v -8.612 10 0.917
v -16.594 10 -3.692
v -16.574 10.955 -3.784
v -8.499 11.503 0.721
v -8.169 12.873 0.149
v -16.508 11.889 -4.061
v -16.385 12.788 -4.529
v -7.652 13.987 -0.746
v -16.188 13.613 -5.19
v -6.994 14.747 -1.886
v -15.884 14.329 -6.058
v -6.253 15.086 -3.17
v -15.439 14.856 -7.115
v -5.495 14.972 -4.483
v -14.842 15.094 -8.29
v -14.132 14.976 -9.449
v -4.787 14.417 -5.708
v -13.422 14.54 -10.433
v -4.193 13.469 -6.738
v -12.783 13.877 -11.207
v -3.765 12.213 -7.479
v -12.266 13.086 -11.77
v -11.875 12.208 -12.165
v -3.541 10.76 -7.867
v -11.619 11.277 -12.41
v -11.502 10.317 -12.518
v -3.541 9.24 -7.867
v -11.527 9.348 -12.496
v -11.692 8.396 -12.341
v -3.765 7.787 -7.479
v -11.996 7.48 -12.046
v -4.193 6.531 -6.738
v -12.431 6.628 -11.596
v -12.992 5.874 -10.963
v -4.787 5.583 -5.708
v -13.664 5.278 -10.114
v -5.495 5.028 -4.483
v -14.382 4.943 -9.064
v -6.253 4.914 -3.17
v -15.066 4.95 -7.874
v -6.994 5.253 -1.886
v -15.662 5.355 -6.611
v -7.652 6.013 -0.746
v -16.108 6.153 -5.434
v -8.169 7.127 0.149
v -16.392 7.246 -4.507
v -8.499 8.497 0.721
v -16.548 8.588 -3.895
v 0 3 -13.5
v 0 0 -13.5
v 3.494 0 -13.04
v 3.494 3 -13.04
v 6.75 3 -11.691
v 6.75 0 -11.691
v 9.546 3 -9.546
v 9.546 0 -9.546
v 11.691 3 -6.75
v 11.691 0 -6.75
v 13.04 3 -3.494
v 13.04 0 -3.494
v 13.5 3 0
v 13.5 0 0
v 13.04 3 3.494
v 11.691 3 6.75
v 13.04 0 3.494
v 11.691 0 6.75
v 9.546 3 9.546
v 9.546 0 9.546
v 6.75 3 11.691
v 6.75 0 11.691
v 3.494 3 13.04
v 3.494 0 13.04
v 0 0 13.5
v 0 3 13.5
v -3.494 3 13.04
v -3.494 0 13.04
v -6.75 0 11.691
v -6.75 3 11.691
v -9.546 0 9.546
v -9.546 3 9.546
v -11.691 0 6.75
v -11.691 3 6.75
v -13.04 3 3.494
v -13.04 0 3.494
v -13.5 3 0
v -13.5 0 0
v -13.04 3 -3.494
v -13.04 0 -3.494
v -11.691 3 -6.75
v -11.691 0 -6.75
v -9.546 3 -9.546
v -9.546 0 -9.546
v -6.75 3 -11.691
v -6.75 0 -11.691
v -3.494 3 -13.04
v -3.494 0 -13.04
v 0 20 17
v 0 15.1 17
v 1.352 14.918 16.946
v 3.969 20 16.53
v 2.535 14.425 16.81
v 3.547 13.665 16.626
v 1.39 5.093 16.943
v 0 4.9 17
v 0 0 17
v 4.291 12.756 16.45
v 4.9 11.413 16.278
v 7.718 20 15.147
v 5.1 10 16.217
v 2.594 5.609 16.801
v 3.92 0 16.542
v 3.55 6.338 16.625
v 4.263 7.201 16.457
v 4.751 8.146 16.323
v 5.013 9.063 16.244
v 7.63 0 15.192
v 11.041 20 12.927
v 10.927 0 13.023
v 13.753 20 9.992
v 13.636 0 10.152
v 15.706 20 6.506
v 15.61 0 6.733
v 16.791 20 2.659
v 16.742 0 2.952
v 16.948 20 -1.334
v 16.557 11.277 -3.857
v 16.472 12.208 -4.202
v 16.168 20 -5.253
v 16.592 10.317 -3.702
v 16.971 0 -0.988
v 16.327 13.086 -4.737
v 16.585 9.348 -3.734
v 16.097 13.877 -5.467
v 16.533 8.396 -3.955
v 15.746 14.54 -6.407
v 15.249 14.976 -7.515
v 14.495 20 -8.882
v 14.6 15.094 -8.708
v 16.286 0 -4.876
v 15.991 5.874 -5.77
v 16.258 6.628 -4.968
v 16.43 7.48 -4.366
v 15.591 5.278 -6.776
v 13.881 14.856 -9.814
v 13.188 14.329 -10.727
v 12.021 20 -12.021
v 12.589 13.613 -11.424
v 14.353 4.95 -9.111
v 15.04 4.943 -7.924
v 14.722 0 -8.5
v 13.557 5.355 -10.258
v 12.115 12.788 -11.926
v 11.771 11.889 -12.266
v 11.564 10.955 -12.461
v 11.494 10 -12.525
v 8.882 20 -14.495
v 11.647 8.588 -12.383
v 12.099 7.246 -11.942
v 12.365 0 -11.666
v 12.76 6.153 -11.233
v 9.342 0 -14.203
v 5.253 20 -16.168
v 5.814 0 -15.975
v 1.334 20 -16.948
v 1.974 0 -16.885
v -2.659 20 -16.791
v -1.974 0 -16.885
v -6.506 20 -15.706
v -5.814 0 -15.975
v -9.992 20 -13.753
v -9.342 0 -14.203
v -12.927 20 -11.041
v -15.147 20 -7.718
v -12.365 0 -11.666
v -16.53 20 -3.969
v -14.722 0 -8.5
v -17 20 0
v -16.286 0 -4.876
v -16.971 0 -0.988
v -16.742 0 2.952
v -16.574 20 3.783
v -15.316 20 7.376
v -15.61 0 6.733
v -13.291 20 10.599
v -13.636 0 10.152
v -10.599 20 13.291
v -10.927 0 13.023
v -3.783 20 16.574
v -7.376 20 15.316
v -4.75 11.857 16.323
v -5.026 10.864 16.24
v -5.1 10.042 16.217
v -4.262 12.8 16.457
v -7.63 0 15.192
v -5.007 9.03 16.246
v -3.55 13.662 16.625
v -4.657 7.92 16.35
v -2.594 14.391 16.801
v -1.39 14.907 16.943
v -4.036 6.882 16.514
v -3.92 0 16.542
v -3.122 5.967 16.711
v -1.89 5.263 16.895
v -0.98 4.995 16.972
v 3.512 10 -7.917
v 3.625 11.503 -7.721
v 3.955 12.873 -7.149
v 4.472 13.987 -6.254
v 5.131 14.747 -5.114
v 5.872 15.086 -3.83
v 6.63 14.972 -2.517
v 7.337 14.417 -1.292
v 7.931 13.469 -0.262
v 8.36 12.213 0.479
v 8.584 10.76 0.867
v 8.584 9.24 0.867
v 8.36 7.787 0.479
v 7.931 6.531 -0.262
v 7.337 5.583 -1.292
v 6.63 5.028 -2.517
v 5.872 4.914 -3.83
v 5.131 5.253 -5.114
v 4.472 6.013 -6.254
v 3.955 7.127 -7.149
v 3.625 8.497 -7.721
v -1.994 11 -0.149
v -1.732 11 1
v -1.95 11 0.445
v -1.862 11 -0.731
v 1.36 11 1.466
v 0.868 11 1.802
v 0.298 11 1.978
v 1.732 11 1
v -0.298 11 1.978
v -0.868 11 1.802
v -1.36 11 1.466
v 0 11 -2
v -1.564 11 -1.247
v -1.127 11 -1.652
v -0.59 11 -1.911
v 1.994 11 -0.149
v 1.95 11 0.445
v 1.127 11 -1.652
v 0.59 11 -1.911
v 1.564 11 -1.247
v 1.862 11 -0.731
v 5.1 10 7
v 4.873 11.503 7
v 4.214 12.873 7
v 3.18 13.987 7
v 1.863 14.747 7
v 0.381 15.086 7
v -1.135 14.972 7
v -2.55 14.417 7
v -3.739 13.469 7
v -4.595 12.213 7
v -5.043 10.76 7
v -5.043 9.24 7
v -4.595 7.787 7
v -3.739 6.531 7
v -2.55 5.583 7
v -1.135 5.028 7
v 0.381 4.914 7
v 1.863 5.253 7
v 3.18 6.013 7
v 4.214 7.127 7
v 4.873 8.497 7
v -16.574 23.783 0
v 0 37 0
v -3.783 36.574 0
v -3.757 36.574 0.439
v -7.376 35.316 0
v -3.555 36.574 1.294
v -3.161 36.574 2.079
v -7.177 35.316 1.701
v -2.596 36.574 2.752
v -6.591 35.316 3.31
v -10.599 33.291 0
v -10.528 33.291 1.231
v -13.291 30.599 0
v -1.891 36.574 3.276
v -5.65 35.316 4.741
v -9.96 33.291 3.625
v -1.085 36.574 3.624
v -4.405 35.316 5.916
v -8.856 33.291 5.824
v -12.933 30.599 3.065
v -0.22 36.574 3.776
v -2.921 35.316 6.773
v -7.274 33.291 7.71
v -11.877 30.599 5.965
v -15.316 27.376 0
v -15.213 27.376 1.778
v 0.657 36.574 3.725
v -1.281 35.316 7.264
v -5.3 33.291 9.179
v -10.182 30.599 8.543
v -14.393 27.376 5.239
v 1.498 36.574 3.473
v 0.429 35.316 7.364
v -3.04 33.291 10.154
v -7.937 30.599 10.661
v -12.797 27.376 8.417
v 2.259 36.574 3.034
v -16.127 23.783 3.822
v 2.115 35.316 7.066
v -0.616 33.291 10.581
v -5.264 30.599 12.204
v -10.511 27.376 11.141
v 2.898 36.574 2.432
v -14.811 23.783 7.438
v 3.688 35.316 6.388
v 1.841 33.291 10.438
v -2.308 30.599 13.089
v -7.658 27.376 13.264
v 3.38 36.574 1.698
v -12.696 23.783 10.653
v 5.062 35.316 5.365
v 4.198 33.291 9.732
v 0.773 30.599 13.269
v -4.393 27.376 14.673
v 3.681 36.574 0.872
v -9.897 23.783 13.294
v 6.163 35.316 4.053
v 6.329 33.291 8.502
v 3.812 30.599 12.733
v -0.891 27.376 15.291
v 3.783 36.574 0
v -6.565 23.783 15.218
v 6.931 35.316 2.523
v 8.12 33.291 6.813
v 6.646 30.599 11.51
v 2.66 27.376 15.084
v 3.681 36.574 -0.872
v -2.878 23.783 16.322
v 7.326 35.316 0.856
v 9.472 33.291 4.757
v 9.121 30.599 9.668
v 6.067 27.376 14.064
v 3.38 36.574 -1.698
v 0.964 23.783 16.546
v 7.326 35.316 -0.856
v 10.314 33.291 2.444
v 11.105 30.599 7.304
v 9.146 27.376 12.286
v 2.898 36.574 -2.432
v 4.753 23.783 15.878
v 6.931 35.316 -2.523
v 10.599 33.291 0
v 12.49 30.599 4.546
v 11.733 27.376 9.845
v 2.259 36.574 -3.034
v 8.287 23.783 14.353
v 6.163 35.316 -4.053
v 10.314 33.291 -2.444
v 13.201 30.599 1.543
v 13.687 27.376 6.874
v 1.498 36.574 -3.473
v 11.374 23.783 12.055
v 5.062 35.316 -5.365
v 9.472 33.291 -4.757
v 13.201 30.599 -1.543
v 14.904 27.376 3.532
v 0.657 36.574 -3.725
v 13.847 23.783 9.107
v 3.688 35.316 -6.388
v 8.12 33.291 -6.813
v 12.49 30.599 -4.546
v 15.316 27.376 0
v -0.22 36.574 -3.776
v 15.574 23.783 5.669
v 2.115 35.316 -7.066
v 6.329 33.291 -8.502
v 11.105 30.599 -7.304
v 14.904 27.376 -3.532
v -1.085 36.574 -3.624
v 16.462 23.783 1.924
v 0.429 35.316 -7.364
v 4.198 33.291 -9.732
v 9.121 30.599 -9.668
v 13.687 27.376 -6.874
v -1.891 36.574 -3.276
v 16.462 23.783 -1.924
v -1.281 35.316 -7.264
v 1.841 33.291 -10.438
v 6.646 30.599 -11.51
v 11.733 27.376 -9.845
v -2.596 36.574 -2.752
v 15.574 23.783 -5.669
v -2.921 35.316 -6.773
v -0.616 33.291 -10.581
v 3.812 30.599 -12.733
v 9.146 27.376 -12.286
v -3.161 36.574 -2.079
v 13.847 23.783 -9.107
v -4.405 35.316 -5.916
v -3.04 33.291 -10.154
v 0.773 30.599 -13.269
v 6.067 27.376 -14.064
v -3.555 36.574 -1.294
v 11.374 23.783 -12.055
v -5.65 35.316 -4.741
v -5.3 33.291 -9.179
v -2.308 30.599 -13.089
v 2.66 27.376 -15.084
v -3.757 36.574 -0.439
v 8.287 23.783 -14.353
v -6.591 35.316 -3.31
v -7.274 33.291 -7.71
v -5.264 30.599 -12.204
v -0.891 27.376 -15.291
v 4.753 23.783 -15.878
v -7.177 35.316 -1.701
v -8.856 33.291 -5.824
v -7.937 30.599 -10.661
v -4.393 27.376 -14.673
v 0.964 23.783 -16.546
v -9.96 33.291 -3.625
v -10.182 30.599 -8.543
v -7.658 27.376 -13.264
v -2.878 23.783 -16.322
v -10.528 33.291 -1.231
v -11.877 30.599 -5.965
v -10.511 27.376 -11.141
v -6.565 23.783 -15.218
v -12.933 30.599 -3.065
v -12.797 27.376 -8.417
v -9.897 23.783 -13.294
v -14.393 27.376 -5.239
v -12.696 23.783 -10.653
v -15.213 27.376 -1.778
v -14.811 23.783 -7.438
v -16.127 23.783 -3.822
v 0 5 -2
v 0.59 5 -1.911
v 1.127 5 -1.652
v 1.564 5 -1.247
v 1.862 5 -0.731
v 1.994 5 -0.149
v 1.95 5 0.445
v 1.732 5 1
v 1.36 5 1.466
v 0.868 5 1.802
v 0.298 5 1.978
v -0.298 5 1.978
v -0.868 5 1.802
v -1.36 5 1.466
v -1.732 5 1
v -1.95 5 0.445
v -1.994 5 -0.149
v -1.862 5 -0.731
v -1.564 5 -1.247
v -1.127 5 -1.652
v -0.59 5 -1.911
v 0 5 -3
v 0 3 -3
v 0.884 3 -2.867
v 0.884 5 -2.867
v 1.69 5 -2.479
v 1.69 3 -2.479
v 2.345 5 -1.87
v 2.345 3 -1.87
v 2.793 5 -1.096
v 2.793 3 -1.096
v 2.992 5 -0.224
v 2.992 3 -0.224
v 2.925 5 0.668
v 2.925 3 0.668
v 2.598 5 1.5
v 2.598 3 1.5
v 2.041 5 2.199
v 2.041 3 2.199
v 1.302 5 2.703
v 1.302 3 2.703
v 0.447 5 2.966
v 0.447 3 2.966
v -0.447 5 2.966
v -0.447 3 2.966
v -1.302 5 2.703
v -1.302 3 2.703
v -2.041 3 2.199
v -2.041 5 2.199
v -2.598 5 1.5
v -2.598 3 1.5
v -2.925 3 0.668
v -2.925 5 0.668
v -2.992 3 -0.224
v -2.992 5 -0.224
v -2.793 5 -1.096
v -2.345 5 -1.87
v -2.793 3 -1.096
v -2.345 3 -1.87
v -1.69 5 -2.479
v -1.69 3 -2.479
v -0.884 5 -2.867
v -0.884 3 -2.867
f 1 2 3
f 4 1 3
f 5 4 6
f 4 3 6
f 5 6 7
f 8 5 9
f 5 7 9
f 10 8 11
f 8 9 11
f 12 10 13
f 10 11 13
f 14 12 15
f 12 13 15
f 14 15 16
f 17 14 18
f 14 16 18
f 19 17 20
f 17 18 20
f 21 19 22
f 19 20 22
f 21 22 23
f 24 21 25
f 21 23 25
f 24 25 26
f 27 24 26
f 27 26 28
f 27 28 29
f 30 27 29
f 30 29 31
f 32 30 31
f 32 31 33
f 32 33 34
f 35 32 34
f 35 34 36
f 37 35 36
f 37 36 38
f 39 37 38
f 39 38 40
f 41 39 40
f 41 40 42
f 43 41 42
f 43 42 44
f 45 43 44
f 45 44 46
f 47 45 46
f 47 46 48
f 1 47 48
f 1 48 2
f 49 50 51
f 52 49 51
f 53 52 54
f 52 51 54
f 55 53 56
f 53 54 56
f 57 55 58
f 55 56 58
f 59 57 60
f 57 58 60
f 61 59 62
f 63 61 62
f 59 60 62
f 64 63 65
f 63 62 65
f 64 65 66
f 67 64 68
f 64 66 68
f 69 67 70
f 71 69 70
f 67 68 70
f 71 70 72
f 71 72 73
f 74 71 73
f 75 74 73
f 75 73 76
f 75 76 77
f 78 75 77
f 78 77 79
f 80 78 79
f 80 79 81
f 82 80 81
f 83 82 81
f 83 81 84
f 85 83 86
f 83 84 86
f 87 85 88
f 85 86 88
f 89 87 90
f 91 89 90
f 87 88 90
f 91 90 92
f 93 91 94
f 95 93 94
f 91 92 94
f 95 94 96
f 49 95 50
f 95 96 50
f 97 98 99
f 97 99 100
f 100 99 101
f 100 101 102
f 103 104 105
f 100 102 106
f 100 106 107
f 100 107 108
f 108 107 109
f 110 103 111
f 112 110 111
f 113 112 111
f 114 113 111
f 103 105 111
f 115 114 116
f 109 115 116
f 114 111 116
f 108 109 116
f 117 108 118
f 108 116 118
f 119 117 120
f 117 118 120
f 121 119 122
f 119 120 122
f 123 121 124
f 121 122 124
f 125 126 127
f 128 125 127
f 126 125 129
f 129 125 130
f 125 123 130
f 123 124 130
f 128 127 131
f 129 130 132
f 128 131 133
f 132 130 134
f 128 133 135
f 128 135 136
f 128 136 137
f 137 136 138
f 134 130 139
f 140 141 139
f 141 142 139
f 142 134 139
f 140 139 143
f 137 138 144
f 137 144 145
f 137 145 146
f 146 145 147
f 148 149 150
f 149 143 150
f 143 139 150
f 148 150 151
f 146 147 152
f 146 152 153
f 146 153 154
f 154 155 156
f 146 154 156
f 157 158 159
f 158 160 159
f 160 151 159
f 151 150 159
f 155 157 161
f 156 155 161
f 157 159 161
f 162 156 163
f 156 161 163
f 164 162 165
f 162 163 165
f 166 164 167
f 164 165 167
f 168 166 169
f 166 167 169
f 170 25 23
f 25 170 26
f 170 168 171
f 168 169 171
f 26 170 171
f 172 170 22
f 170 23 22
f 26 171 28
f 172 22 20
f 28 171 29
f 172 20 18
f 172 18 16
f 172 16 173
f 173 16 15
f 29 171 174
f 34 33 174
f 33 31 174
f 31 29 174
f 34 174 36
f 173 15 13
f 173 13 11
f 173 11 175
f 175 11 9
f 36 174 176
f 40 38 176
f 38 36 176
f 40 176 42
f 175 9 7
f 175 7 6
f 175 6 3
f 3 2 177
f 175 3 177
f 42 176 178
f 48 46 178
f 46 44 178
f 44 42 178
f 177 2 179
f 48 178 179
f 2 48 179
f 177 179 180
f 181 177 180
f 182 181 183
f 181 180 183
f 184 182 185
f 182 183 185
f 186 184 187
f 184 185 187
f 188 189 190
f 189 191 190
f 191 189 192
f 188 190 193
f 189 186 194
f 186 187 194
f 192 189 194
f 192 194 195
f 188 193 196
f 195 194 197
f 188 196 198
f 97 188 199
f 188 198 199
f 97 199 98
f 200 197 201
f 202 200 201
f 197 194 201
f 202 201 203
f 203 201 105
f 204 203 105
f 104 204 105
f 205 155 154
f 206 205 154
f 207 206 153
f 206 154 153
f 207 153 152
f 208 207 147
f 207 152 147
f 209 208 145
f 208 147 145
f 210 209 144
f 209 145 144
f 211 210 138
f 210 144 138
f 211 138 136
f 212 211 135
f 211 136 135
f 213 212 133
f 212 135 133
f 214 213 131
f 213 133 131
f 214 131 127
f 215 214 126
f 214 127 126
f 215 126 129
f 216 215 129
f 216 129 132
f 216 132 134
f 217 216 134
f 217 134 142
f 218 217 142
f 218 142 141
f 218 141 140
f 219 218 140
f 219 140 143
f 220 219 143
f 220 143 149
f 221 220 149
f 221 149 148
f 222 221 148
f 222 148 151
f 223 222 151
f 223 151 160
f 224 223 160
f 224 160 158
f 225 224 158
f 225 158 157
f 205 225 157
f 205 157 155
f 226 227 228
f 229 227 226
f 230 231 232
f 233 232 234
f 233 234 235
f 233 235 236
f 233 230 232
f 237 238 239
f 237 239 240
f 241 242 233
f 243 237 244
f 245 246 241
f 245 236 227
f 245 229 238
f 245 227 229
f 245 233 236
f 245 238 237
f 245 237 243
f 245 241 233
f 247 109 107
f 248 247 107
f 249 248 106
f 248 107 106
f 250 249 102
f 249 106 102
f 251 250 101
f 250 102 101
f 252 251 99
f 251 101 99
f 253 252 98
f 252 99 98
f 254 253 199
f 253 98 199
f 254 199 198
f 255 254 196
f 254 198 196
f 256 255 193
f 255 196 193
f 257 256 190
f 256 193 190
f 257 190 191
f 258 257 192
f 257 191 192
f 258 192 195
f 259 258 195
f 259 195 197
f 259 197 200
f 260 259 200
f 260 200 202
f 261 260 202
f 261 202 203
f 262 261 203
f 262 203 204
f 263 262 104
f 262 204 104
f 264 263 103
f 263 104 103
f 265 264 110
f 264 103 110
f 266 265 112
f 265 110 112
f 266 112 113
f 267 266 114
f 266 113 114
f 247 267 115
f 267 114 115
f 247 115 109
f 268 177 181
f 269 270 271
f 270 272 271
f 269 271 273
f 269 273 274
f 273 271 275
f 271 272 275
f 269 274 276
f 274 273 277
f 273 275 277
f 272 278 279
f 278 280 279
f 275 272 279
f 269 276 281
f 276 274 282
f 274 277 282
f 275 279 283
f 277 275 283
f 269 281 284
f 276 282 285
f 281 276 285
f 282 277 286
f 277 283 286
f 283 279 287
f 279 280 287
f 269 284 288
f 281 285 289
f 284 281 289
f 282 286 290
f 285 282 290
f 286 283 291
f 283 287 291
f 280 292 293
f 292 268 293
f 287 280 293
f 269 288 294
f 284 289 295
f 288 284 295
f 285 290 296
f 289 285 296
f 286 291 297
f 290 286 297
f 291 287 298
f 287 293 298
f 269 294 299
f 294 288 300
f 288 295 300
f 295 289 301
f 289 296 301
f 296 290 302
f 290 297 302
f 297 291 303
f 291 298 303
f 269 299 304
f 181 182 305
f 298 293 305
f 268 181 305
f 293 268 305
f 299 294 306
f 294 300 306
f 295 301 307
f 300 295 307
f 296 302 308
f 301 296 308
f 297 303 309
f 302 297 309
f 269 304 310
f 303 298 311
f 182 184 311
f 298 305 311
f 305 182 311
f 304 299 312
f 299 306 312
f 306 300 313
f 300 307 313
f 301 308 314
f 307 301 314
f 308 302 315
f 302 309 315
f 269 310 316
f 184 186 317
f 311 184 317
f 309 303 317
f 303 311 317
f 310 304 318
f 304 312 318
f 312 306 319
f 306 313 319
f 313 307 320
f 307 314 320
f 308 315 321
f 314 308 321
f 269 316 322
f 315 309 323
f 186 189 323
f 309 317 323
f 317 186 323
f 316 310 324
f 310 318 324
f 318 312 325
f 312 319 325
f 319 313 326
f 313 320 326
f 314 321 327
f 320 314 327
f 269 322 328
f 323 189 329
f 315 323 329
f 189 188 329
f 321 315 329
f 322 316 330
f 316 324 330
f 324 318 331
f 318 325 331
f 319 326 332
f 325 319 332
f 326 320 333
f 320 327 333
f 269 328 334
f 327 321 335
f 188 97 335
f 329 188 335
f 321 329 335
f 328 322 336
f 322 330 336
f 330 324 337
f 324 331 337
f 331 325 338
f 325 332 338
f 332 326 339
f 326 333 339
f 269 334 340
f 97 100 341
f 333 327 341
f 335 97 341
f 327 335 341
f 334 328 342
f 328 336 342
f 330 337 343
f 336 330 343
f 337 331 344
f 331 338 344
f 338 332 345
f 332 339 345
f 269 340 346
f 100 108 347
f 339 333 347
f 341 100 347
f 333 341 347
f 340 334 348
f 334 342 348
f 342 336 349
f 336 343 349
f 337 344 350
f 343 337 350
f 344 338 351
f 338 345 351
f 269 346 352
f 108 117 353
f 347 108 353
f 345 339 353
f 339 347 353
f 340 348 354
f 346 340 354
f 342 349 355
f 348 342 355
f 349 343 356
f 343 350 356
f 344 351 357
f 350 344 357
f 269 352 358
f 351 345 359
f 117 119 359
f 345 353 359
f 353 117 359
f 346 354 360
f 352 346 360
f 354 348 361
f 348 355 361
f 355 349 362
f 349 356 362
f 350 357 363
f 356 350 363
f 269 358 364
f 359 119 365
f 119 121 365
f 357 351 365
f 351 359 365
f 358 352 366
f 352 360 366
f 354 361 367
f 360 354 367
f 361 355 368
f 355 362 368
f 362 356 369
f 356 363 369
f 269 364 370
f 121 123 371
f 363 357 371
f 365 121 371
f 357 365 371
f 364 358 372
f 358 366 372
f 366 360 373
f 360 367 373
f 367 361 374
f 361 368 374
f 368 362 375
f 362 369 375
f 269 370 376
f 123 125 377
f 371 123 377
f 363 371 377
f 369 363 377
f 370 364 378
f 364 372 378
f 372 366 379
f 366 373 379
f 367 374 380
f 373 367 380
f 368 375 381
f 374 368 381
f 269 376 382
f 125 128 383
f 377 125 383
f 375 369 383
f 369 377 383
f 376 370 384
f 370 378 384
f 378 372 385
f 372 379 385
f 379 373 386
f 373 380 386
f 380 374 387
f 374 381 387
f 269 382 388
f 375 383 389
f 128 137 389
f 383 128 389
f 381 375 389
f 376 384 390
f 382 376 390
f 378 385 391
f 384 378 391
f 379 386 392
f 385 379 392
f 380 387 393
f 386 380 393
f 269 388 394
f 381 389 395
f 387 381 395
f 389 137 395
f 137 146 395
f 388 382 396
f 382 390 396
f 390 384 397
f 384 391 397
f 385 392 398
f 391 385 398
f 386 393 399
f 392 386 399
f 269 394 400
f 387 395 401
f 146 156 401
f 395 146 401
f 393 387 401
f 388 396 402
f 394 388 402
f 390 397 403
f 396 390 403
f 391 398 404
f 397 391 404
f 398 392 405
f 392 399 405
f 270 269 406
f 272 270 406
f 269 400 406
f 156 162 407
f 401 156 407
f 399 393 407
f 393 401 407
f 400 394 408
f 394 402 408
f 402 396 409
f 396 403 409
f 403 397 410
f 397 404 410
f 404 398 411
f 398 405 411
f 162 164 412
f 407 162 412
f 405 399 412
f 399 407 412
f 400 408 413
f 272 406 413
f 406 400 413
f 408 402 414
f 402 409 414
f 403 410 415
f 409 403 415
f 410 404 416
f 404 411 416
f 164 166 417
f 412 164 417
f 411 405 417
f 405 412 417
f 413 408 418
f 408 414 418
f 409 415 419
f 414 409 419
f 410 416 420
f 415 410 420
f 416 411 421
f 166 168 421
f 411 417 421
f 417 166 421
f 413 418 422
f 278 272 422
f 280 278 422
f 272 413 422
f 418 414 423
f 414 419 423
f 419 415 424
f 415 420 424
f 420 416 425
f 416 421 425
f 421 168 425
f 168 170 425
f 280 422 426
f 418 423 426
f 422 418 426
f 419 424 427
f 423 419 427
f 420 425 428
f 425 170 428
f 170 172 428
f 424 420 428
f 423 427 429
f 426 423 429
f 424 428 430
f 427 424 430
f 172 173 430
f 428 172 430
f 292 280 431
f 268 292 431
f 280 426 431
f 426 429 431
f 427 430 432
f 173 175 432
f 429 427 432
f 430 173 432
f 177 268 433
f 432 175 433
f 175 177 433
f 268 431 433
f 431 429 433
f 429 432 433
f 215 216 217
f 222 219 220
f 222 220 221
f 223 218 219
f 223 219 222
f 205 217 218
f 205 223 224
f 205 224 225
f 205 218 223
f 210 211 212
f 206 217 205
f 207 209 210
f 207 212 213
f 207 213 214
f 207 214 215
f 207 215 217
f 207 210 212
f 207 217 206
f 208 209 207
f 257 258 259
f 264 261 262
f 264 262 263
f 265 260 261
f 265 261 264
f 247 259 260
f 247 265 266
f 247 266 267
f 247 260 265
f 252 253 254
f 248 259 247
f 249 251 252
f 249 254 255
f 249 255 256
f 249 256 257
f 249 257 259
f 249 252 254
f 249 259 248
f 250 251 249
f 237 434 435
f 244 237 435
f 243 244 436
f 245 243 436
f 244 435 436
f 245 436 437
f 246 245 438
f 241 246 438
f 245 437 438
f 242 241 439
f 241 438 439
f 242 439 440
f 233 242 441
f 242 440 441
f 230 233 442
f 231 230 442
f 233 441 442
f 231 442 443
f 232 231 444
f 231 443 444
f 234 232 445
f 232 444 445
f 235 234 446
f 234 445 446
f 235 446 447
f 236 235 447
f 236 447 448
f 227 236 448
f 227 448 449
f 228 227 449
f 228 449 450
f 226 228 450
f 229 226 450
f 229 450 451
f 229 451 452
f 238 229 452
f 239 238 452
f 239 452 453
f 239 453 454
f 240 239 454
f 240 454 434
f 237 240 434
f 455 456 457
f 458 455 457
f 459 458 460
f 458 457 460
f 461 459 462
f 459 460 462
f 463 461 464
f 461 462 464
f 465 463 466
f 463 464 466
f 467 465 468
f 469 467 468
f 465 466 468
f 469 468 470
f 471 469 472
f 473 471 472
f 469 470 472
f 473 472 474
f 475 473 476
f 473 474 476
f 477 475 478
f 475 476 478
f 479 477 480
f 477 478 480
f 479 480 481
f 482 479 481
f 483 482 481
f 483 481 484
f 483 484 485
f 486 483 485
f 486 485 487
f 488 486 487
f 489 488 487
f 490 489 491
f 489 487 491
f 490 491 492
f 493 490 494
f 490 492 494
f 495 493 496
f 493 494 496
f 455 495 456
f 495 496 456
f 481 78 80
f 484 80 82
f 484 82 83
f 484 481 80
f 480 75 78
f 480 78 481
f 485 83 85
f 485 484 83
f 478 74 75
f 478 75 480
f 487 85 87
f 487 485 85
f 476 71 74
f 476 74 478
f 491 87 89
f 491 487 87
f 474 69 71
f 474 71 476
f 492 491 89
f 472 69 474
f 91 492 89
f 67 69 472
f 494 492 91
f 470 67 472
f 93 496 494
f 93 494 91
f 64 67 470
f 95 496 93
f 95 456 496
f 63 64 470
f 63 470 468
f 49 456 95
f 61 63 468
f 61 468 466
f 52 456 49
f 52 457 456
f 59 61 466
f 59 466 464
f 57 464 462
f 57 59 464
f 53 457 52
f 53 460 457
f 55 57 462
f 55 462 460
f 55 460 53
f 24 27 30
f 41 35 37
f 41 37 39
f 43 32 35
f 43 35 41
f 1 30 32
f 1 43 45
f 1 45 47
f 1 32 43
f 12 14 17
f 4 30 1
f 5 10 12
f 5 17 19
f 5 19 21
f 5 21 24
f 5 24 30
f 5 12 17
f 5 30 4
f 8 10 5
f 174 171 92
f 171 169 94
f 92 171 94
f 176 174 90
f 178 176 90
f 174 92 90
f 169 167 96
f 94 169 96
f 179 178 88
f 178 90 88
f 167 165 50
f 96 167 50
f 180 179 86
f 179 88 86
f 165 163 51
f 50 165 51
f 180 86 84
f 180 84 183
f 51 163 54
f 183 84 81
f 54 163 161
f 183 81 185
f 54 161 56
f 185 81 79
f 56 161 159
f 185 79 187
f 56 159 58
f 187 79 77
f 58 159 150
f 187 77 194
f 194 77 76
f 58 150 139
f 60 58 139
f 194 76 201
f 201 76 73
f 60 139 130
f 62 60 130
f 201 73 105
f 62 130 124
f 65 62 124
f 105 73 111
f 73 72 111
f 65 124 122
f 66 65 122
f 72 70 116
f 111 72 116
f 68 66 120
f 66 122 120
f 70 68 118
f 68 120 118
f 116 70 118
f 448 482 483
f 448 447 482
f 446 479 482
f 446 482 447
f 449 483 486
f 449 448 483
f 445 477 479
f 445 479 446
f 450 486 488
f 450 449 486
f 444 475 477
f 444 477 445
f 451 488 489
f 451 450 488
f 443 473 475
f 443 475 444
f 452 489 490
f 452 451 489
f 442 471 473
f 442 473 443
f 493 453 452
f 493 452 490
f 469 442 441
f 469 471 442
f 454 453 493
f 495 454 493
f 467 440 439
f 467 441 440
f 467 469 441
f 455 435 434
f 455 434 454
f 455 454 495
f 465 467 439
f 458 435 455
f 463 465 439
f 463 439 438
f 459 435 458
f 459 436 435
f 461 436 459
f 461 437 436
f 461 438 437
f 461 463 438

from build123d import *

# Parameters (mm, degrees)
CIRKEL_R                   = 17
CILINDER_DEPTH             = 20
CIRKEL_GAT_R               = 5.1
OPENING_DEPTH              = 10
GATEN_PATROON_COUNT        = 3
CIRKEL1_R                  = 13.5
OPENING_OPZET_DEPTH        = 3
CIRKEL2_R                  = 2
GAT_VERLOOPSTUK_DEPTH      = 8
CIRKEL3_R                  = 3
GAT_VERLOOPSTUK_RAND_DEPTH = 2


with BuildPart() as part:
    # cirkel → cilinder (new body)
    with BuildSketch(Plane(origin=(0, 0, 0), x_dir=(1, 0, 0), z_dir=(0, 1, 0))):
        with Locations(Location((0, 0, 0), (0, 0, 270))):
            Circle(CIRKEL_R)
    extrude(amount=CILINDER_DEPTH)

    # boog → bol (revolve)
    with BuildSketch(Plane.XY):
        with BuildLine():
            Line((0, 20), (0, 37))
            ThreePointArc((0, 37), (-12.02081528, 32.02081528), (-17, 20))
            Line((-17, 20), (0, 20))
        make_face()
    revolve(axis=Axis((0, 20, 0), (0, 1, 0)))

    # cirkel_gat → opening (cut)
    with BuildSketch(Plane.XY.offset(17)):
        with Locations((0, 10)):
            Circle(CIRKEL_GAT_R)
    opening = extrude(amount=-OPENING_DEPTH, mode=Mode.SUBTRACT)

    # gaten_patroon: opening ×3 about axis
    gaten_patroon_axis = Axis((0, 0, 0), (0, 1, 0))
    for i in range(1, GATEN_PATROON_COUNT):
        add(opening.rotate(gaten_patroon_axis, i * 360 / GATEN_PATROON_COUNT), mode=Mode.SUBTRACT)

    # cirkel1 → opening_opzet (cut)
    with BuildSketch(Plane(origin=(0, 0, 0), x_dir=(-1, 0, 0), z_dir=(0, -1, 0))):
        with Locations(Location((0, 0, 0), (0, 0, 90))):
            Circle(CIRKEL1_R)
    extrude(amount=-OPENING_OPZET_DEPTH, mode=Mode.SUBTRACT)

    # cirkel2 → gat_verloopstuk (cut)
    with BuildSketch(Plane(origin=(0, 3, 0), x_dir=(-1, 0, 0), z_dir=(0, -1, 0))):
        with Locations(Location((0, 0, 0), (0, 0, 90))):
            Circle(CIRKEL2_R)
    extrude(amount=-GAT_VERLOOPSTUK_DEPTH, mode=Mode.SUBTRACT)

    # cirkel3 → gat_verloopstuk_rand (cut)
    with BuildSketch(Plane.XZ.offset(-3)):
        with Locations(Location((0, 0, 0), (0, 0, 270))):
            Circle(CIRKEL3_R)
    extrude(amount=-GAT_VERLOOPSTUK_RAND_DEPTH, mode=Mode.SUBTRACT)


solid = part.part
